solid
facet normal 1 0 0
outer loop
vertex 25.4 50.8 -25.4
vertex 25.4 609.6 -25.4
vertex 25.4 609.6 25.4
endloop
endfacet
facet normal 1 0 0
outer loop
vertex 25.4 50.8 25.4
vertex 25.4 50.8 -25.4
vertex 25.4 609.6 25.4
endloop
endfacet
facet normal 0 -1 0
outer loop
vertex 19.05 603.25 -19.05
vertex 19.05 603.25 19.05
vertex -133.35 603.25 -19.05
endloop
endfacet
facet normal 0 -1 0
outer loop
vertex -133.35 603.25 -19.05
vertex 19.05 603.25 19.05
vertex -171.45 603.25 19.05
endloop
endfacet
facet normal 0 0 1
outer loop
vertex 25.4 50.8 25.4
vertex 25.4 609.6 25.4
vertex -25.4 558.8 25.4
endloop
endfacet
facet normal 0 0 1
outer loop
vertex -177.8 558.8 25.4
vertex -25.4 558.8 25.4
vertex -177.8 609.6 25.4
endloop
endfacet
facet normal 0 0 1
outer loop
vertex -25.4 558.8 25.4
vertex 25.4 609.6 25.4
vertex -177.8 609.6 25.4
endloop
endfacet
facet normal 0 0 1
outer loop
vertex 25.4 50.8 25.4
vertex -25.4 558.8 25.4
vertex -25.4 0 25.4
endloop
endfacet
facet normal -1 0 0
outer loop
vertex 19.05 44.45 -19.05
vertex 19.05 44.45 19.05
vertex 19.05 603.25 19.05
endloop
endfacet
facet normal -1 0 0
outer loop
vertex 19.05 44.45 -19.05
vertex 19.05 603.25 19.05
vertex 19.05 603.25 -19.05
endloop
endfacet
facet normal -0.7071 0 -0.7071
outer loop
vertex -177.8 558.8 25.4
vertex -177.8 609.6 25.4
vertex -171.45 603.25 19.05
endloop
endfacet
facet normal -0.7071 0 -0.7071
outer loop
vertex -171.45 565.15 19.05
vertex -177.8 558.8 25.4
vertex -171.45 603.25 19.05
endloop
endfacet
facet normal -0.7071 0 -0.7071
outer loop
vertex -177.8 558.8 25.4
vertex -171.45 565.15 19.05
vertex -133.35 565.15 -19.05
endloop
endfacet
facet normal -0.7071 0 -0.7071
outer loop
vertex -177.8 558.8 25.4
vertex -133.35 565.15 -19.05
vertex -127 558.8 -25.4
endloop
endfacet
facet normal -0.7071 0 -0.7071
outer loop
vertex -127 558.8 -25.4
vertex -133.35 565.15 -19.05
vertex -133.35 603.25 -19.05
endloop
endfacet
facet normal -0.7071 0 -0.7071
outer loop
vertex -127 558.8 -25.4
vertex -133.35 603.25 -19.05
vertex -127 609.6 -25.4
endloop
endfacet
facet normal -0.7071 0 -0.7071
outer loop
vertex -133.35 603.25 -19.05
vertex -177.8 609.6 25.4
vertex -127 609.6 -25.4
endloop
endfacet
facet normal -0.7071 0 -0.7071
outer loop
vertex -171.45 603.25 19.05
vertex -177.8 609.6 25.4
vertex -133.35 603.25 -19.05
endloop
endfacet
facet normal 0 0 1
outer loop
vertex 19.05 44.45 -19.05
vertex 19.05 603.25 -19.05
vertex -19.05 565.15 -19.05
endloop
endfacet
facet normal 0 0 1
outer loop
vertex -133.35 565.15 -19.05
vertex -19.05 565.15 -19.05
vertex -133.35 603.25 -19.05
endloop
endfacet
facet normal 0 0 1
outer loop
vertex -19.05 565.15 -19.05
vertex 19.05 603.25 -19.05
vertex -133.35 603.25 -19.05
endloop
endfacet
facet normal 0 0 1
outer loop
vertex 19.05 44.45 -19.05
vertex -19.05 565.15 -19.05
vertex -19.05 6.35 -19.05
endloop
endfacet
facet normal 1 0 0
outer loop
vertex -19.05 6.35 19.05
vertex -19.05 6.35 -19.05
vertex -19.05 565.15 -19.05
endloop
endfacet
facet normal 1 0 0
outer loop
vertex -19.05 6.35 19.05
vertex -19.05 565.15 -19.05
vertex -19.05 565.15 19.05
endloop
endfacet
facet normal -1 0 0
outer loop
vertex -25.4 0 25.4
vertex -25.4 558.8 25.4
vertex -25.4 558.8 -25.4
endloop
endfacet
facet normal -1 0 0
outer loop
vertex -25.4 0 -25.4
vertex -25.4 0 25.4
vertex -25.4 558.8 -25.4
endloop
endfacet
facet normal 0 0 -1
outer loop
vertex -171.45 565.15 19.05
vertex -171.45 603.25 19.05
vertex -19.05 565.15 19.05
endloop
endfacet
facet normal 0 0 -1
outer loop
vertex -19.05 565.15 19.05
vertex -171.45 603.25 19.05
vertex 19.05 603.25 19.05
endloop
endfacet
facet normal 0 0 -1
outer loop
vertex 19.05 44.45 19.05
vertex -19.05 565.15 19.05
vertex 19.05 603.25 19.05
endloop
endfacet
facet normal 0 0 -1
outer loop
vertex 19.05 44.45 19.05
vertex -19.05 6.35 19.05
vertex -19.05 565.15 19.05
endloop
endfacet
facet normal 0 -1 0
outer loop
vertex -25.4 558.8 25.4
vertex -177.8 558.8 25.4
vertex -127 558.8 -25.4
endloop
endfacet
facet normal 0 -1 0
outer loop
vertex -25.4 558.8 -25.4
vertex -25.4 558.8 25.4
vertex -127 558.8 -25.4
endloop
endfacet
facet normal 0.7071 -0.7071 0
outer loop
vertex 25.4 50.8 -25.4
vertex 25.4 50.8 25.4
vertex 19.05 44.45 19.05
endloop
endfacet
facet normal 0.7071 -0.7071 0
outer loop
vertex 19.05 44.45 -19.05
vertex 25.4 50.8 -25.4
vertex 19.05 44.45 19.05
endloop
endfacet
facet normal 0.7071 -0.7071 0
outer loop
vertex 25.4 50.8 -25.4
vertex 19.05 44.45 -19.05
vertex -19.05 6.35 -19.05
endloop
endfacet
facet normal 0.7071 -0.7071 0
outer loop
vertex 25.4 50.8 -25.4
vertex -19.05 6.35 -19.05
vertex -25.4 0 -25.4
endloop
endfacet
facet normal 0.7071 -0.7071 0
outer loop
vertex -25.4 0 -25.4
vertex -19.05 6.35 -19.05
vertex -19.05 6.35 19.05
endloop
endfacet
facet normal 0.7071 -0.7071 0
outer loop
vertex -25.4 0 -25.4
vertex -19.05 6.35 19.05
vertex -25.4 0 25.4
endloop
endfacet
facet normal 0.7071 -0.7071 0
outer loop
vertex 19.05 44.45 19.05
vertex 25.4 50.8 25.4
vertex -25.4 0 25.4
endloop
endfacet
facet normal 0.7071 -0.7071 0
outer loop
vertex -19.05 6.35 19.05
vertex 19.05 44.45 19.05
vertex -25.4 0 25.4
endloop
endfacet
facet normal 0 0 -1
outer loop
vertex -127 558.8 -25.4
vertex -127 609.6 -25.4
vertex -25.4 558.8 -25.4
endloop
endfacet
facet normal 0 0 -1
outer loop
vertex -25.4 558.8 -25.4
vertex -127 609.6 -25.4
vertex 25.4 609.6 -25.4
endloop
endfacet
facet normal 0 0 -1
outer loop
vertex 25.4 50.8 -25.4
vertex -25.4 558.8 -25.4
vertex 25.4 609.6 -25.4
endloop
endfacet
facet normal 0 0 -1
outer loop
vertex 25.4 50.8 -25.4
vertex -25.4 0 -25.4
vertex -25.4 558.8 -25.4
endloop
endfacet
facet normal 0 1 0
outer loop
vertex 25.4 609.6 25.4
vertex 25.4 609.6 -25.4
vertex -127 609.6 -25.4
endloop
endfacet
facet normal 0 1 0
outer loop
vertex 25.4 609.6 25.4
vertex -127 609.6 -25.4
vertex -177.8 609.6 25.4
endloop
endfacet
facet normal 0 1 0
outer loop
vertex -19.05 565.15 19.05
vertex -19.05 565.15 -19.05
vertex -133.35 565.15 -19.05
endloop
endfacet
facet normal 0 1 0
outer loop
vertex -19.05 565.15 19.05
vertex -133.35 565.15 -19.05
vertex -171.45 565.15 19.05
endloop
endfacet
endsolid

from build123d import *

# Parameters (mm, degrees)
F1_W     = 50.8
F1_H     = 50.8
F1_W_2   = 38.1
F1_H_2   = 38.1
F4_DEPTH = 50.801
F6_DEPTH = 609.601


with BuildPart() as f2:
    # F2: sweep along a path in F0
    with BuildLine(Plane.XY) as f2_path:
        Line((0, 0), (0, 584.2))
        Line((0, 584.2), (-177.8, 584.2))
    # F1 (on Front) → F2 (sweep)
    with BuildSketch(Plane.XZ):
        Rectangle(F1_W, F1_H)
        Rectangle(F1_W_2, F1_H_2, mode=Mode.SUBTRACT)
    sweep(path=f2_path.line, transition=Transition.RIGHT)

    # F3 (on face) → F4 (cut, through all)
    with BuildSketch(Plane.XY.offset(25.4)):
        Polygon((-25.4, 0), (25.4, 0), (25.4, 50.8), align=None)
    extrude(amount=-F4_DEPTH, mode=Mode.SUBTRACT)

    # F5 (on face) → F6 (cut, through all)
    with BuildSketch(Plane(origin=(0, 609.6, 0), x_dir=(-1, 0, 0), z_dir=(0, 1, 0))):
        Polygon((177.8, -25.4), (177.8, 25.4), (127, -25.4), align=None)
    extrude(amount=-F6_DEPTH, mode=Mode.SUBTRACT)


solid = f2.part
